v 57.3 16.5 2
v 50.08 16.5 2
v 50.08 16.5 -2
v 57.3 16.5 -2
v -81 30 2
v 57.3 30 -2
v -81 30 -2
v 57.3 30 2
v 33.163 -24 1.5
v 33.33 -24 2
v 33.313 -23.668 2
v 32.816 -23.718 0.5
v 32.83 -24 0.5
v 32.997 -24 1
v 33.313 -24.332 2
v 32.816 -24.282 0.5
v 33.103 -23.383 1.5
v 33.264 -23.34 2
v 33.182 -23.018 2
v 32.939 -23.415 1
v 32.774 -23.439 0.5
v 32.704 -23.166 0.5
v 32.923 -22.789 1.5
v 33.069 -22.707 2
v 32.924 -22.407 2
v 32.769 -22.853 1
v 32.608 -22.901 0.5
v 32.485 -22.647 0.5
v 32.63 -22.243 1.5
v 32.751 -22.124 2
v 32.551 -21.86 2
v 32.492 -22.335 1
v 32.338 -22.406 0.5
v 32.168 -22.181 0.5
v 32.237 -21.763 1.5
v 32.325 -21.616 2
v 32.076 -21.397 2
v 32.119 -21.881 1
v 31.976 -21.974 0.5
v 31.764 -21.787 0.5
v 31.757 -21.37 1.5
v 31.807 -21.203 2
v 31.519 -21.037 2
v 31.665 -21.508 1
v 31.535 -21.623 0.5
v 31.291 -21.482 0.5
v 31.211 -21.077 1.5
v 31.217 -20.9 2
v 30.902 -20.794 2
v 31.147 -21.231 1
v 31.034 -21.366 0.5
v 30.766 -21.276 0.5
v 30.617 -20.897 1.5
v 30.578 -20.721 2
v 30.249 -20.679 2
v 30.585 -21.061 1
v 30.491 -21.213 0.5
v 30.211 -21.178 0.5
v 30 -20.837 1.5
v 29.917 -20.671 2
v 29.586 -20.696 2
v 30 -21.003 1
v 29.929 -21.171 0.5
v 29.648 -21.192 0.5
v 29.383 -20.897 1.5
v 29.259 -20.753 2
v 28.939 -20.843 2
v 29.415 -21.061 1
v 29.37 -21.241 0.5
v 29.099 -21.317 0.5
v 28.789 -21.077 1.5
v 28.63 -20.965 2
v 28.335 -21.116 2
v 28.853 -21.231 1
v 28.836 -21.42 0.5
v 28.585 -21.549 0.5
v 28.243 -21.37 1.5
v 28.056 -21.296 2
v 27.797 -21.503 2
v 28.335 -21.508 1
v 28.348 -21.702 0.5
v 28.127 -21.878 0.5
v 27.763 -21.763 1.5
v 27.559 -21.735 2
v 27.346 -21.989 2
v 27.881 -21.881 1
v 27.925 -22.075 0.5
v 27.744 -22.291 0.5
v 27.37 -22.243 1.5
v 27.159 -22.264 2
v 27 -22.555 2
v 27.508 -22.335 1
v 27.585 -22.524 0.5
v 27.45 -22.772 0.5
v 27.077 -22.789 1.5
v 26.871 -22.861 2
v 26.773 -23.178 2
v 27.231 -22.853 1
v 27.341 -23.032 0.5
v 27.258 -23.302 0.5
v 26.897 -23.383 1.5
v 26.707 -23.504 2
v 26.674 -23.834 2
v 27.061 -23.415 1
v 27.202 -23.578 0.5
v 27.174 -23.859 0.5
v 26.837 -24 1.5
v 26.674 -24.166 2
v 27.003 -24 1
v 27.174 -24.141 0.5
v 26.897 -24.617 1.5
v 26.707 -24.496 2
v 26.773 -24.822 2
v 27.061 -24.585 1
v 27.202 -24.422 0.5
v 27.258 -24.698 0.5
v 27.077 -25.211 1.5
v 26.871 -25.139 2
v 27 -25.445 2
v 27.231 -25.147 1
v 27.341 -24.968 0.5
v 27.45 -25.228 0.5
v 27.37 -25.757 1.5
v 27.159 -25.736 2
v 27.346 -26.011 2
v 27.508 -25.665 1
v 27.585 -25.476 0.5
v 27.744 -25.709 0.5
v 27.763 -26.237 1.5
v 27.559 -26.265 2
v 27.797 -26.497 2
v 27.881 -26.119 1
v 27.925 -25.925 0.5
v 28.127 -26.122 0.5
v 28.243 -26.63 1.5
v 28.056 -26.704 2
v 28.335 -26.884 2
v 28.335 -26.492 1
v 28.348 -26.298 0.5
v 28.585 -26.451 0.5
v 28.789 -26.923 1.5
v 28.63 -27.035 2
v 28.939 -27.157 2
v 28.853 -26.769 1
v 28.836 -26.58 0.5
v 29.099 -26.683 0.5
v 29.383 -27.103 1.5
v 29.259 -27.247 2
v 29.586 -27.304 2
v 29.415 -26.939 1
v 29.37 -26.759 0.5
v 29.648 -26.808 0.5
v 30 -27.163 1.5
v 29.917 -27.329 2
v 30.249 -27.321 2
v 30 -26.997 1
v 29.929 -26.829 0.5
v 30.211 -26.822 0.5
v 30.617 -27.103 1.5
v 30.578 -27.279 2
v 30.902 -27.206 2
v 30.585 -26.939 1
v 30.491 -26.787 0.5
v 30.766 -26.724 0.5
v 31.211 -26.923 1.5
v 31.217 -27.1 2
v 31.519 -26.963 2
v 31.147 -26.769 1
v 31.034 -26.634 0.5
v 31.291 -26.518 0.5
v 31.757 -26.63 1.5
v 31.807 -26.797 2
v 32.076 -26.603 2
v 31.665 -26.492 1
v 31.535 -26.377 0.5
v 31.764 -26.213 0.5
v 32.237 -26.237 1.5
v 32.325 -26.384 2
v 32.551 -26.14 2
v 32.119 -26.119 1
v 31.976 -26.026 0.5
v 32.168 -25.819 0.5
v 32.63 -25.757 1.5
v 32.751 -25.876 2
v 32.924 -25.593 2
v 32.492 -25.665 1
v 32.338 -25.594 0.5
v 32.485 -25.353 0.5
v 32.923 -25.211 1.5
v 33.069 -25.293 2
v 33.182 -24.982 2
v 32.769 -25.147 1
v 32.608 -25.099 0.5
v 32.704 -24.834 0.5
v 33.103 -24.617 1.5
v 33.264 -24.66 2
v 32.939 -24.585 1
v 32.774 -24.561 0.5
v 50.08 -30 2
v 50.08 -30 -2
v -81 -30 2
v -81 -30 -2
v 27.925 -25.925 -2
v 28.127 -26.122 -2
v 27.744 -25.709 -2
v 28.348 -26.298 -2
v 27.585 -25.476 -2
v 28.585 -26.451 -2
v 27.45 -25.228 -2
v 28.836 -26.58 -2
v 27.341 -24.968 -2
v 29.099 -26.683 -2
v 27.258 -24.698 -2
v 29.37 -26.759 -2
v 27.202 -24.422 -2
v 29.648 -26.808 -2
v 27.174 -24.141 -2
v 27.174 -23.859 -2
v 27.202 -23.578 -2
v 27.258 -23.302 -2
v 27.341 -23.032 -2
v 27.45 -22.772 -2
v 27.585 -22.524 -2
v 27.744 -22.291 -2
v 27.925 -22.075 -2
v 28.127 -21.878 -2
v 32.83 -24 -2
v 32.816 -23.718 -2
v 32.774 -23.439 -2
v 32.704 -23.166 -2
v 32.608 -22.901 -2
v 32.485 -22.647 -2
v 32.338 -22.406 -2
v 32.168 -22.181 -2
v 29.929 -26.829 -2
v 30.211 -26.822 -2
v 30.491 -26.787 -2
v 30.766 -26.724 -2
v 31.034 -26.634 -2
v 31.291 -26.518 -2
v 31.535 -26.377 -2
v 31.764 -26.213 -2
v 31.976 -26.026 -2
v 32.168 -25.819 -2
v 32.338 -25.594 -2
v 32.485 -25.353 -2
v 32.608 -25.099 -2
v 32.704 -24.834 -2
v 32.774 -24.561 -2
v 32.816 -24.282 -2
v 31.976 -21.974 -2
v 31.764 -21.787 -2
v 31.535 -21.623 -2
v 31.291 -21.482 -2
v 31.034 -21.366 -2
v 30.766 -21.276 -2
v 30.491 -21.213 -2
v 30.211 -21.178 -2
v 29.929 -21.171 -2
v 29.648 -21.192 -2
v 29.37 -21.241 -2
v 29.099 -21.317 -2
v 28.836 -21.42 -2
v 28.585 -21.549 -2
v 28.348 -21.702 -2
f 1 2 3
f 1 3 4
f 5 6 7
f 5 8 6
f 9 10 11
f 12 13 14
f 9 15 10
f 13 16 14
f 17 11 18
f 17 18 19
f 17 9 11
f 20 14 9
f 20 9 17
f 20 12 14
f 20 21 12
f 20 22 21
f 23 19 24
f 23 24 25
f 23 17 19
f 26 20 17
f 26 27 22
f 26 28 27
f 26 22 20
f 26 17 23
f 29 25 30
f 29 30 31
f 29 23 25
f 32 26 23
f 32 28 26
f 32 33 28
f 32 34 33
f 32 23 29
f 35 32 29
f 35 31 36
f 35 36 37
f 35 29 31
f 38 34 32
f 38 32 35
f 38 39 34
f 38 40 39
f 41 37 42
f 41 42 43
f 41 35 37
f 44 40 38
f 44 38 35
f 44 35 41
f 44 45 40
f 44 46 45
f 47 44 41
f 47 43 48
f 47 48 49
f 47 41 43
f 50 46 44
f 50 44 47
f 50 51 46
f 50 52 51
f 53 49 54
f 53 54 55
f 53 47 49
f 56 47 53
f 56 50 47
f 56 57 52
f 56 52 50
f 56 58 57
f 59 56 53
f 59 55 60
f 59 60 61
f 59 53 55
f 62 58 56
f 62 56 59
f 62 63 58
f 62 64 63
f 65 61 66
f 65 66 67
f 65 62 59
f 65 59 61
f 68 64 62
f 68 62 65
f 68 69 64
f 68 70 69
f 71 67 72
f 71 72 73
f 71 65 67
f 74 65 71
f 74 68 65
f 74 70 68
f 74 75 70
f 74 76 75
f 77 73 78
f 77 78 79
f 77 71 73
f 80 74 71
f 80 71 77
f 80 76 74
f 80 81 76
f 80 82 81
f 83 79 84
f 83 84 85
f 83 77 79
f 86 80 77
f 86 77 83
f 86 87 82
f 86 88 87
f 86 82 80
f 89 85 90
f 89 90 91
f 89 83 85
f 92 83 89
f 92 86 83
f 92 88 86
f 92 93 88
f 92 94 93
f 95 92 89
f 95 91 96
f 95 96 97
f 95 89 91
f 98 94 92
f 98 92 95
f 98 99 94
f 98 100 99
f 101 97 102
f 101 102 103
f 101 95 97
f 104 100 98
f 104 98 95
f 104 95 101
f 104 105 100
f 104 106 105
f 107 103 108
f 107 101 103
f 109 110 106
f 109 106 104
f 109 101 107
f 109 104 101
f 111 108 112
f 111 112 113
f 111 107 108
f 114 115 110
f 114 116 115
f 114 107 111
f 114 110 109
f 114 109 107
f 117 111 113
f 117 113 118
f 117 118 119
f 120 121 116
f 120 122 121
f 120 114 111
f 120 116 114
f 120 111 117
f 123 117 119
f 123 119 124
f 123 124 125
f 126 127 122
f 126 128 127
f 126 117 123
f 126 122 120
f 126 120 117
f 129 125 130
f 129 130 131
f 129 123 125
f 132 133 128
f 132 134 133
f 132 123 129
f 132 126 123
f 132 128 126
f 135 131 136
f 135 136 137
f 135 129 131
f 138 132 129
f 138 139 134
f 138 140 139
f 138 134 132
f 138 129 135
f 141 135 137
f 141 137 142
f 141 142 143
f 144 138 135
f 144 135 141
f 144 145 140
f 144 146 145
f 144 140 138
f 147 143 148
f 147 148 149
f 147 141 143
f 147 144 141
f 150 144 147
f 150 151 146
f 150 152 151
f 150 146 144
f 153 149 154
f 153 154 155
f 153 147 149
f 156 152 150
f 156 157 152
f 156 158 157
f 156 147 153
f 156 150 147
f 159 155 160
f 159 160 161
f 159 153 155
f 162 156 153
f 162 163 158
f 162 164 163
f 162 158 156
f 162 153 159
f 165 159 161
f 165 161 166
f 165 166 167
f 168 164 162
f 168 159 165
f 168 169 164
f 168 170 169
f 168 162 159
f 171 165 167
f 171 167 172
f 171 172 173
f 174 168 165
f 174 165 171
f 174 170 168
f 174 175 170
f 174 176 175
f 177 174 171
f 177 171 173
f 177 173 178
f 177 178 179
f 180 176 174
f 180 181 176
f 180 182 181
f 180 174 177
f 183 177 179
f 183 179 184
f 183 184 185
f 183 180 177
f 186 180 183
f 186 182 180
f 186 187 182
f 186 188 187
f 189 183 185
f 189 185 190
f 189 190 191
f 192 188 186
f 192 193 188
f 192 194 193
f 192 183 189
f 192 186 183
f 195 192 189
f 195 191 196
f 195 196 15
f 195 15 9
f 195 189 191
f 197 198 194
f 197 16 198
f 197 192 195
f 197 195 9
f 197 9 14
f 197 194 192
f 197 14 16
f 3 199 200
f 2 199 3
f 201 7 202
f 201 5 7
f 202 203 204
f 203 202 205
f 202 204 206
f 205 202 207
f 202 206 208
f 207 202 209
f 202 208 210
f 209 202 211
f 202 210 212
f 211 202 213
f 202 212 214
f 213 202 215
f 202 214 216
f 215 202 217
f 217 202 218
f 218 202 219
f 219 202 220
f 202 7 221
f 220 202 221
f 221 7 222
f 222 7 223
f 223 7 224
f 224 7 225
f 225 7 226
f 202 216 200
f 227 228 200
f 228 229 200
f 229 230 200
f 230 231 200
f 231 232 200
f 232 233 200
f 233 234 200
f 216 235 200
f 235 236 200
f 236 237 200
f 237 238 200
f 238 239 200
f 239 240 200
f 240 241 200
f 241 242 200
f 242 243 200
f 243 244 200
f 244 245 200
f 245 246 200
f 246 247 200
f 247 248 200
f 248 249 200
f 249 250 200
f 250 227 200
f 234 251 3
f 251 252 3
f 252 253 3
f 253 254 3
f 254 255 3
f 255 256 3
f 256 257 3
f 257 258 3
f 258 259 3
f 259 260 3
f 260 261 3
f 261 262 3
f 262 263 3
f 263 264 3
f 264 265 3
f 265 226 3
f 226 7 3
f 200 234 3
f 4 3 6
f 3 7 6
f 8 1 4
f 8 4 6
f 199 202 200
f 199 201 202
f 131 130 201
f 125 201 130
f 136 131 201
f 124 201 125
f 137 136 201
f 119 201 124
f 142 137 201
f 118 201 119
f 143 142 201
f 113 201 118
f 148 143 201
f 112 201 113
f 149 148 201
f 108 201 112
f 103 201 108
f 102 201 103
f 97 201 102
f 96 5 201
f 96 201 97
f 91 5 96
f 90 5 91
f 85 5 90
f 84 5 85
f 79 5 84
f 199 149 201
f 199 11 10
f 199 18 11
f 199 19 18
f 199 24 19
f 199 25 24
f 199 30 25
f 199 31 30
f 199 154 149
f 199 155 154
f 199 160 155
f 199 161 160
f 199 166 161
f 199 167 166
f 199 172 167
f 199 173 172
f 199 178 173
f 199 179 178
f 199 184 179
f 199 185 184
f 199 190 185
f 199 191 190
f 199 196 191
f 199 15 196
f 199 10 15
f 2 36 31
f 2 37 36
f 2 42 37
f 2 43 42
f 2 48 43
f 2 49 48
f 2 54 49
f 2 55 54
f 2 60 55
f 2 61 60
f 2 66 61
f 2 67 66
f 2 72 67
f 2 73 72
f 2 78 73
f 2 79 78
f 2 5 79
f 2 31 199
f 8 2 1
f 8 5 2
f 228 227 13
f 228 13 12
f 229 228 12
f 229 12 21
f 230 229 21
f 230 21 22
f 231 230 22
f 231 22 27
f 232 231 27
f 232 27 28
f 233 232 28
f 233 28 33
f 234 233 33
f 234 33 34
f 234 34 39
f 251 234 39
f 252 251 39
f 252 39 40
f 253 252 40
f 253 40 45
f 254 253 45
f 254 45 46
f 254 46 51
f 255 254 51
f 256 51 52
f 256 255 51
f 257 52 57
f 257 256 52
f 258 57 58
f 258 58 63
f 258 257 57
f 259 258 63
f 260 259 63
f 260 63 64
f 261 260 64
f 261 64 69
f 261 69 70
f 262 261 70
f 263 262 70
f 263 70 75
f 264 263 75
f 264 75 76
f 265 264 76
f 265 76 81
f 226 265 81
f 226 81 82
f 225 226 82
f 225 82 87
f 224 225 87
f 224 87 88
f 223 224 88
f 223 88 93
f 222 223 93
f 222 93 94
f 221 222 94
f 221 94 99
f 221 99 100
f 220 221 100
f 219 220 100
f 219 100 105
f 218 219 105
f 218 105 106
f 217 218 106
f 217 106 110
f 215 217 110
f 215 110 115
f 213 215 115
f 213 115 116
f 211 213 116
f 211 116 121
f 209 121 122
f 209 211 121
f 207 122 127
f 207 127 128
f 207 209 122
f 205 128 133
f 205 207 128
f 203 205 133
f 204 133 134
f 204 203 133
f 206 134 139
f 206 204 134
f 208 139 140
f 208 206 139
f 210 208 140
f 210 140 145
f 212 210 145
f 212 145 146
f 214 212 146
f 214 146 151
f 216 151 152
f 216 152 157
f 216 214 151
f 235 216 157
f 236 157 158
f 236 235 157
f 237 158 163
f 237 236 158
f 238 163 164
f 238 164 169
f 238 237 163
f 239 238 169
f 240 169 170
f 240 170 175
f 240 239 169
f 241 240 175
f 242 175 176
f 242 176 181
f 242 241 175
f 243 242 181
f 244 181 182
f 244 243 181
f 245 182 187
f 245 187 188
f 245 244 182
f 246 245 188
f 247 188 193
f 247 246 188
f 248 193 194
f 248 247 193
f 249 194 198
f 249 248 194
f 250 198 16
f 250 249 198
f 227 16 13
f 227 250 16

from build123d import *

# Parameters (mm, degrees)
SKETCH1_R           = 2.83
BOSS_EXTRUDE1_DEPTH = 2
CHAMFER1_SIZE       = 0.5
CHAMFER1_SIZE2      = 1.5


with BuildPart() as part:
    # Sketch1 → Boss-Extrude1 (new, symmetric)
    with BuildSketch(Plane.XY):
        Polygon((-81, -30), (50.07973639, -30), (50.07973639, 16.5), (57.3, 16.5), (57.3, 30), (-81, 30), align=None)
        with Locations((30, -24)):
            Circle(SKETCH1_R, mode=Mode.SUBTRACT)
    extrude(amount=BOSS_EXTRUDE1_DEPTH, both=True)

    # Chamfer1
    chamfer1_edges = [part.edges().sort_by_distance(p)[0] for p in [
        (27.17, -24, 2),
    ]]
    chamfer1_side = [part.faces().sort_by_distance(p)[0] for p in [
        (-14.755026682, 0.36160791, 2),
    ]]
    chamfer(chamfer1_edges, length=CHAMFER1_SIZE, length2=CHAMFER1_SIZE2, reference=chamfer1_side[0])


solid = part.part
